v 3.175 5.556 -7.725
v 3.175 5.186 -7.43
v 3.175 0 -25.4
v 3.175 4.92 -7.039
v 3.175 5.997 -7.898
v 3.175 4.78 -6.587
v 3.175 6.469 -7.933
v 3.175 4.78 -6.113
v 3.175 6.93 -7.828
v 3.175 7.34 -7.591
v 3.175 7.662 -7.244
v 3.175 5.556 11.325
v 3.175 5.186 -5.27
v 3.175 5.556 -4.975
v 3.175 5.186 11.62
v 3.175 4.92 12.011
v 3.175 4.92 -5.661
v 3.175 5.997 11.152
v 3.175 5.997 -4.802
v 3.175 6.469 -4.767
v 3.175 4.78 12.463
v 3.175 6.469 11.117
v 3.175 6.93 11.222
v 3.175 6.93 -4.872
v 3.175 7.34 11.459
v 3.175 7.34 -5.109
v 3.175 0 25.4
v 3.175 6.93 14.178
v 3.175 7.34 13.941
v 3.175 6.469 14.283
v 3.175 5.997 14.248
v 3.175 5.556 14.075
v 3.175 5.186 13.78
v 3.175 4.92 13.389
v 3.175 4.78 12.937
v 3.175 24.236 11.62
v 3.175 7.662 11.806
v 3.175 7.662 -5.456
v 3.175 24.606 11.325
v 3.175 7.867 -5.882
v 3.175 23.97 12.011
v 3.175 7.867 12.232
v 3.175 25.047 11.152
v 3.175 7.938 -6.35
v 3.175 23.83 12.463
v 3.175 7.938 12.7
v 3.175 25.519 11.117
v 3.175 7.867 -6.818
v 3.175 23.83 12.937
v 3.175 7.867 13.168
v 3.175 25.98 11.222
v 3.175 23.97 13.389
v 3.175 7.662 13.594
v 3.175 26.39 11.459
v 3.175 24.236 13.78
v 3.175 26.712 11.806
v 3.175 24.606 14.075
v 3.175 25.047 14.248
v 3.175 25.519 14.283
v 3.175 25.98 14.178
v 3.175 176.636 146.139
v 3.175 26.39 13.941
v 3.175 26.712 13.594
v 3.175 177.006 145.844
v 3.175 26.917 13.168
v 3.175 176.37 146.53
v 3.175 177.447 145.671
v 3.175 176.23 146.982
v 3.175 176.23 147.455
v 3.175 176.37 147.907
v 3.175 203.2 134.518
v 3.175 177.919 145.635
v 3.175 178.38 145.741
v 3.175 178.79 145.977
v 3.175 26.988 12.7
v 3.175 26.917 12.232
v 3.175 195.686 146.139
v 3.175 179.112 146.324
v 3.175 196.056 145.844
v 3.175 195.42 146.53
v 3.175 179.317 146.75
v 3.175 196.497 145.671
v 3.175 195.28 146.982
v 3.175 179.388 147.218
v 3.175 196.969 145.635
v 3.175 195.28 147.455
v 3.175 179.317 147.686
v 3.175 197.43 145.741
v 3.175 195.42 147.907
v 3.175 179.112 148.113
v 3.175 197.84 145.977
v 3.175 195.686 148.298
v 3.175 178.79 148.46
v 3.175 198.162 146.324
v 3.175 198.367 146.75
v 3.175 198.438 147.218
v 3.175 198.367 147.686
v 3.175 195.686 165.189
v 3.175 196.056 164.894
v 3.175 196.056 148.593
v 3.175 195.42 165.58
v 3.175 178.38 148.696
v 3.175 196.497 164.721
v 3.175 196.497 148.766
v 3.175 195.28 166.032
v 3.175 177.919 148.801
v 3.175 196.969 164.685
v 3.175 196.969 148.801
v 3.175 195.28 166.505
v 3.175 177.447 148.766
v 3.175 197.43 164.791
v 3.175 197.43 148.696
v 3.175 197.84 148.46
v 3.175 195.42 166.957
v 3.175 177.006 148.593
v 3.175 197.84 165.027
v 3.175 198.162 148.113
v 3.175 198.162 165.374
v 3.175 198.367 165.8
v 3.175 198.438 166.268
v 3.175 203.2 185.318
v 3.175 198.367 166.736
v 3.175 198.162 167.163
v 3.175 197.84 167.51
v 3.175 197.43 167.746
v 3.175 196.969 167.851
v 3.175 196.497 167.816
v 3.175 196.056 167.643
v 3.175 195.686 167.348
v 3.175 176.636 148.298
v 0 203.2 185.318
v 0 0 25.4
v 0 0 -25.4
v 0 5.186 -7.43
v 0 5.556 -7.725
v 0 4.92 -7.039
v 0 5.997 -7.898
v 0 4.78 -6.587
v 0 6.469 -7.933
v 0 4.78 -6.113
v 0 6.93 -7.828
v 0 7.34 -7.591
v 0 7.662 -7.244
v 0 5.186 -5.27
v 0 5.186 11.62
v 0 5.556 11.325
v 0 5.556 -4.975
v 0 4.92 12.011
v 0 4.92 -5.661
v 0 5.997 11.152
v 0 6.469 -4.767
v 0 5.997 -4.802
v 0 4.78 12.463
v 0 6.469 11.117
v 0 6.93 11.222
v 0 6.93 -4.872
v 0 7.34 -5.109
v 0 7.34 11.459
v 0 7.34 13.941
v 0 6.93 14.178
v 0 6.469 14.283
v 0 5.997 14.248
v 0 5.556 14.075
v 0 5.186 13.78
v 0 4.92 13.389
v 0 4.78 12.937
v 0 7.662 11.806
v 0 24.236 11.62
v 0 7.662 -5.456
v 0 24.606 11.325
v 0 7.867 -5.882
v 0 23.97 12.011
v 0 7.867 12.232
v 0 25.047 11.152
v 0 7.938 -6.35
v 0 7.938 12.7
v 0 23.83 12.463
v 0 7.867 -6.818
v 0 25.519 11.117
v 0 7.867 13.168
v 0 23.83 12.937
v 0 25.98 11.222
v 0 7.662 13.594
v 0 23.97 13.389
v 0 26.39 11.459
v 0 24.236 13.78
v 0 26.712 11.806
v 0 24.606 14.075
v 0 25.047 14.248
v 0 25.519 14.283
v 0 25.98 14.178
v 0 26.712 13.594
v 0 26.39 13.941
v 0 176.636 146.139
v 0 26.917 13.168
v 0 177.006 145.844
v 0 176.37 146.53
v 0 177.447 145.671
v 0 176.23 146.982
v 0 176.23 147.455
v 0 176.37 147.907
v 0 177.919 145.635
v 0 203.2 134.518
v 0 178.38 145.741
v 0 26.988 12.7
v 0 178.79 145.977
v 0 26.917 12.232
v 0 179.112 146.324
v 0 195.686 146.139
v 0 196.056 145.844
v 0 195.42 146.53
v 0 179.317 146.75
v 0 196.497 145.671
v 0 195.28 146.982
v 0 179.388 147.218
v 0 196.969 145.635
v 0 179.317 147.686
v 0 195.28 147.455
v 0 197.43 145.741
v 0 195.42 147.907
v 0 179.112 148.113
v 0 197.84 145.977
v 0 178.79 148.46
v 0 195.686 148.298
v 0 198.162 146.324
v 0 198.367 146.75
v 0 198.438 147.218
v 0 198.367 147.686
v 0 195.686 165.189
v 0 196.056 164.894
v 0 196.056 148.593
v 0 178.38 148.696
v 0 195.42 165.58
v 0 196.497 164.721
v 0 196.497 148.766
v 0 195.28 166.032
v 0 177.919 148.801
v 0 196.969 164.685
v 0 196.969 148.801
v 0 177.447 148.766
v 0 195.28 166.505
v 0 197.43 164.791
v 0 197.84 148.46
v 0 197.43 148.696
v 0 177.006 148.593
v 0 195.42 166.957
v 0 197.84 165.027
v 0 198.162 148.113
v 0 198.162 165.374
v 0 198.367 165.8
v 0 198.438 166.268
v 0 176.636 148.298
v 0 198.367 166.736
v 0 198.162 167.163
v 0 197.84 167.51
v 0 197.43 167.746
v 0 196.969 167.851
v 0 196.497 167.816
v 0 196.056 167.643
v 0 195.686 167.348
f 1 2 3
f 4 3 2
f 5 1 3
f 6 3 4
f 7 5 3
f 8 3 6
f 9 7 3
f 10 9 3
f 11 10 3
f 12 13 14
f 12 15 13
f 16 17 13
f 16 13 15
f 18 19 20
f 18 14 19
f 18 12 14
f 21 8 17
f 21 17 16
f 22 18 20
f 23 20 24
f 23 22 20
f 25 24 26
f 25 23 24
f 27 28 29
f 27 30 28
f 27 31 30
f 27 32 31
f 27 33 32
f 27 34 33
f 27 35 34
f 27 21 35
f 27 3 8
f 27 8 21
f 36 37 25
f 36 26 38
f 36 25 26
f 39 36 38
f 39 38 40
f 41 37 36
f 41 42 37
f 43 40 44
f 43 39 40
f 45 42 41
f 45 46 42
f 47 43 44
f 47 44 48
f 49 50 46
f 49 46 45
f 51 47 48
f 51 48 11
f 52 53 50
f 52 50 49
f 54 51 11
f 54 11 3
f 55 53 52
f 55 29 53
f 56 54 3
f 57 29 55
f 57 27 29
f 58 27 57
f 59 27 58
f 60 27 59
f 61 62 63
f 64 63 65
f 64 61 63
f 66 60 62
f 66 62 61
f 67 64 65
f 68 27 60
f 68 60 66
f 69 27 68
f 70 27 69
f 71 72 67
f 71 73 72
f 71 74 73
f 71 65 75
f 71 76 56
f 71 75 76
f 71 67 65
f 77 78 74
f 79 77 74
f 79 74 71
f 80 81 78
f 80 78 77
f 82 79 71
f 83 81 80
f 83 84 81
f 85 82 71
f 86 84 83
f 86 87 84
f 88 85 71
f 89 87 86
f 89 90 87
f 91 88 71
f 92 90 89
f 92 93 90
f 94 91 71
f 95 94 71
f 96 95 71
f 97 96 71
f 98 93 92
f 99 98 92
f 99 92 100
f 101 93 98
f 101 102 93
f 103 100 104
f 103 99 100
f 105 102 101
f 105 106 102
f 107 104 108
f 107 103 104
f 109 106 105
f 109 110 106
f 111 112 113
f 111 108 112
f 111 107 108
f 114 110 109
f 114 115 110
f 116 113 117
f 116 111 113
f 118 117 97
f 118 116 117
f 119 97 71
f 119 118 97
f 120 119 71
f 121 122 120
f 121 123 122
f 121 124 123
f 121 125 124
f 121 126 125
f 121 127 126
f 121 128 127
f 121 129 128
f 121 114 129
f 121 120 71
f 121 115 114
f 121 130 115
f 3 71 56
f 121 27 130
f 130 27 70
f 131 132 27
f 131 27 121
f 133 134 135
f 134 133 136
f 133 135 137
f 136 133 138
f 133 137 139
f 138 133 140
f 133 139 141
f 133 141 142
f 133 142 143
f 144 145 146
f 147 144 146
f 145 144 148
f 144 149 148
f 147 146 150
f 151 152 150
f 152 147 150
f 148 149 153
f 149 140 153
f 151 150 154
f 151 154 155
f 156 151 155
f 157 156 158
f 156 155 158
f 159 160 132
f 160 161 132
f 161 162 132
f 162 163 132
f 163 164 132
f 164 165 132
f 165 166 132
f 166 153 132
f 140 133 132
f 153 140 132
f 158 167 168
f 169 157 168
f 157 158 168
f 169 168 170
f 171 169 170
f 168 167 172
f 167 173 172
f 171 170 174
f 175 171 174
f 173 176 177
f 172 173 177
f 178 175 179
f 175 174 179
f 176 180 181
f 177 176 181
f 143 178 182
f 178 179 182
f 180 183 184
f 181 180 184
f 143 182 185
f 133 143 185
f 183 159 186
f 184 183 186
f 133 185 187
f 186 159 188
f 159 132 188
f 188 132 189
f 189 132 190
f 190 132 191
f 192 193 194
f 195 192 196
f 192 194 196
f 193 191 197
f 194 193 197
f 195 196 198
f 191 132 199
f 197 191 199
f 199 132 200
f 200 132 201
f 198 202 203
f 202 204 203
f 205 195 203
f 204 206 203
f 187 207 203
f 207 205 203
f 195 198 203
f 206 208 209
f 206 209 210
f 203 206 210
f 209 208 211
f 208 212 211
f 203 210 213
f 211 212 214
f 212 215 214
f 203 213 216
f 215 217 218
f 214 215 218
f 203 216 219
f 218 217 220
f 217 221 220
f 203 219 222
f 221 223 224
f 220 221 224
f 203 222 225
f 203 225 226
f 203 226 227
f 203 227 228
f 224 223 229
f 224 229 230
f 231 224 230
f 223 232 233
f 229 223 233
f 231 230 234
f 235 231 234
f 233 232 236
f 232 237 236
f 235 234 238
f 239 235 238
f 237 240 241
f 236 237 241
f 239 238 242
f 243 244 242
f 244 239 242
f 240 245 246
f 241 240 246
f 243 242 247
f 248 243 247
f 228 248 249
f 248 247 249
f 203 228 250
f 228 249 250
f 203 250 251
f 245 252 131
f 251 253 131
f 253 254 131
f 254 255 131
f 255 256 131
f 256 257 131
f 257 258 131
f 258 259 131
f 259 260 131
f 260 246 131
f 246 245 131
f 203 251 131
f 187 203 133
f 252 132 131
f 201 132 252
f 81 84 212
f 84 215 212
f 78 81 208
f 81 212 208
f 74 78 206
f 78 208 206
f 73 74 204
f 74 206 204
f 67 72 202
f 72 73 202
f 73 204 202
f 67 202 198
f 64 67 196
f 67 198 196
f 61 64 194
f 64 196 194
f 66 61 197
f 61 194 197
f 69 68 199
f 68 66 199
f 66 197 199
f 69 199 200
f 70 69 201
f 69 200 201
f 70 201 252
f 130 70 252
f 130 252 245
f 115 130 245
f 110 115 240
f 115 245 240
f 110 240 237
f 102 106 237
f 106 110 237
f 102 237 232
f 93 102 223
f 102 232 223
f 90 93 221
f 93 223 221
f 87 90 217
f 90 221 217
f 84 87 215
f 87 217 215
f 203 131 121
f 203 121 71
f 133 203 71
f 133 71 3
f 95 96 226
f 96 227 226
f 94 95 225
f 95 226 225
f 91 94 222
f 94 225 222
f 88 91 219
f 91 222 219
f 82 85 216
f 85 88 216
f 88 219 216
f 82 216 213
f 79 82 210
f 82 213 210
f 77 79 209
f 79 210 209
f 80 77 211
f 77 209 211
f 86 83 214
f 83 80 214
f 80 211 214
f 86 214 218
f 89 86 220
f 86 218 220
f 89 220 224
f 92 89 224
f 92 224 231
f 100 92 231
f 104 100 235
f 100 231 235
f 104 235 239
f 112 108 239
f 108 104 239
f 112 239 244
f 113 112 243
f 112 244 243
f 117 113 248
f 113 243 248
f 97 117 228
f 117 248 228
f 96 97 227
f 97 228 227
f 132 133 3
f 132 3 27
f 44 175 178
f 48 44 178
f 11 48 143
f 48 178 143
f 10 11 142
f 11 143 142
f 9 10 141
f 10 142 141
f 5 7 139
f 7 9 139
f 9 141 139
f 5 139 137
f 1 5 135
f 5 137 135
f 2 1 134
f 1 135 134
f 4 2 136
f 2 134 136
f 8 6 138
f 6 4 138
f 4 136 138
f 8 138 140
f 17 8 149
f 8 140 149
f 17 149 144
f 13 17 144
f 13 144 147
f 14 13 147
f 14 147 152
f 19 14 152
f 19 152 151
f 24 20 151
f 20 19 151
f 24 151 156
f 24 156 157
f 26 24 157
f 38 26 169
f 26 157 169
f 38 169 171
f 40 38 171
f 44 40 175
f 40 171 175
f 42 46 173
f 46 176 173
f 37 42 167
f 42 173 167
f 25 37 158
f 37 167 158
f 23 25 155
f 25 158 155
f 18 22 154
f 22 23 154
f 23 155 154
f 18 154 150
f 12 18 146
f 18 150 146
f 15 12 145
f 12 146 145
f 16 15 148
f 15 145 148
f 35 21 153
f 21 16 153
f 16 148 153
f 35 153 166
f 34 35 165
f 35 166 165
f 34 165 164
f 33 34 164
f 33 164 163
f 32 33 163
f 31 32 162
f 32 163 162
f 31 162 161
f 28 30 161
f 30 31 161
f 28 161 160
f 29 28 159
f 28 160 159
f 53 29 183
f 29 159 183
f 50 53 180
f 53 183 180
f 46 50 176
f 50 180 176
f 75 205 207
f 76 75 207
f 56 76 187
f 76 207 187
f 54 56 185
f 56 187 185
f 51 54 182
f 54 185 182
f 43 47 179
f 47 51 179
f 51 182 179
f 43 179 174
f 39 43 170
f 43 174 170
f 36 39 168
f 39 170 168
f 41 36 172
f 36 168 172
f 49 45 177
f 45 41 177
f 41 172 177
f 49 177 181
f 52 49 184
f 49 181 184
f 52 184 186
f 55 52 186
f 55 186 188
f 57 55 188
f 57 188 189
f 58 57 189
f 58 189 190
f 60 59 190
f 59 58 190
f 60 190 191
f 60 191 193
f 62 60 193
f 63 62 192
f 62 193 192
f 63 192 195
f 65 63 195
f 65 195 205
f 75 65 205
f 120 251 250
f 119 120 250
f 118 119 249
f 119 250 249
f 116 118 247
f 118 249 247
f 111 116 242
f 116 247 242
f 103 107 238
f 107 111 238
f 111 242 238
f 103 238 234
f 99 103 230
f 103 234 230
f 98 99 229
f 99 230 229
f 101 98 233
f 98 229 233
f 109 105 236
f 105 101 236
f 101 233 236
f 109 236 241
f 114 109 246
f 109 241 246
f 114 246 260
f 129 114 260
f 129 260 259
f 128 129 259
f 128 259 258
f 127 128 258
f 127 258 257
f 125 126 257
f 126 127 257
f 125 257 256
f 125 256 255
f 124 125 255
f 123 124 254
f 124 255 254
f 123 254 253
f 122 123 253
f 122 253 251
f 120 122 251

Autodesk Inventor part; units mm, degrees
ref_plane "YZ Plane" through (0, 0, 0) normal (1, 0, 0) x (0, 1, 0)
ref_plane "XZ Plane" through (0, 0, 0) normal (0, 1, 0) x (-1, 0, 0)
ref_plane "XY Plane" through (0, 0, 0) normal (0, 0, 1) x (1, 0, 0)
sketch "Sketch1" plane through (0, 0, 0) normal (1, 0, 0) x (0, 1, 0)
  line L0 (203.2, 185.3184) -> (203.2, 134.5184)
  line L1 (203.2, 134.5184) -> (0, -25.4)
  line L2 (0, -25.4) -> (0, 25.4)
  line L3 (0, 25.4) -> (203.2, 185.3184)
  line L4 (0, 0) -> (32.2745, 0) construction
  line L5 (203.2, 159.9184) -> (170.9255, 159.9184) construction
  line L6 (0, 25.4) -> (64.5489, 25.4) construction
  line L7 (203.2, 134.5184) -> (138.6511, 134.5184) construction
  circle A0 centre (196.85, 166.2684) radius 1.5875
  line L8 (203.2, 147.2184) -> (154.7883, 147.2184) construction
  line L9 (203.2, 166.2684) -> (178.9942, 166.2684) construction
  line L10 (196.85, 166.2684) -> (196.85, 147.2184) construction
  circle A1 centre (196.85, 147.2184) radius 1.5875
  circle A2 centre (177.8, 147.2184) radius 1.5875
  line L11 (0, -6.35) -> (24.2058, -6.35) construction
  line L12 (48.4117, 12.7) -> (0, 12.7) construction
  line L13 (6.35, -6.35) -> (6.35, 12.7) construction
  circle A3 centre (6.35, -6.35) radius 1.5875
  circle A4 centre (6.35, 12.7) radius 1.5875
  circle A5 centre (25.4, 12.7) radius 1.5875
  point P0 (0, 0)
  dimension "d0" = 50.8
  dimension "d4" = 159.9184
  dimension "d5" = 3.175
  dimension "d6" = 19.05
  dimension "d7" = 6.35
  dimension "d8" = 19.05
  dimension "d9" = 6.35
  dimension "d10" = 19.05
  dimension "d11" = 6.35
  dimension "d12" = 6.35
  dimension "d13" = 19.05
  dimension "d16" = 190.5
extrude "Extrusion1" add sketch "Sketch1" along normal blind 3.175
properties part number "Cross Brace"
